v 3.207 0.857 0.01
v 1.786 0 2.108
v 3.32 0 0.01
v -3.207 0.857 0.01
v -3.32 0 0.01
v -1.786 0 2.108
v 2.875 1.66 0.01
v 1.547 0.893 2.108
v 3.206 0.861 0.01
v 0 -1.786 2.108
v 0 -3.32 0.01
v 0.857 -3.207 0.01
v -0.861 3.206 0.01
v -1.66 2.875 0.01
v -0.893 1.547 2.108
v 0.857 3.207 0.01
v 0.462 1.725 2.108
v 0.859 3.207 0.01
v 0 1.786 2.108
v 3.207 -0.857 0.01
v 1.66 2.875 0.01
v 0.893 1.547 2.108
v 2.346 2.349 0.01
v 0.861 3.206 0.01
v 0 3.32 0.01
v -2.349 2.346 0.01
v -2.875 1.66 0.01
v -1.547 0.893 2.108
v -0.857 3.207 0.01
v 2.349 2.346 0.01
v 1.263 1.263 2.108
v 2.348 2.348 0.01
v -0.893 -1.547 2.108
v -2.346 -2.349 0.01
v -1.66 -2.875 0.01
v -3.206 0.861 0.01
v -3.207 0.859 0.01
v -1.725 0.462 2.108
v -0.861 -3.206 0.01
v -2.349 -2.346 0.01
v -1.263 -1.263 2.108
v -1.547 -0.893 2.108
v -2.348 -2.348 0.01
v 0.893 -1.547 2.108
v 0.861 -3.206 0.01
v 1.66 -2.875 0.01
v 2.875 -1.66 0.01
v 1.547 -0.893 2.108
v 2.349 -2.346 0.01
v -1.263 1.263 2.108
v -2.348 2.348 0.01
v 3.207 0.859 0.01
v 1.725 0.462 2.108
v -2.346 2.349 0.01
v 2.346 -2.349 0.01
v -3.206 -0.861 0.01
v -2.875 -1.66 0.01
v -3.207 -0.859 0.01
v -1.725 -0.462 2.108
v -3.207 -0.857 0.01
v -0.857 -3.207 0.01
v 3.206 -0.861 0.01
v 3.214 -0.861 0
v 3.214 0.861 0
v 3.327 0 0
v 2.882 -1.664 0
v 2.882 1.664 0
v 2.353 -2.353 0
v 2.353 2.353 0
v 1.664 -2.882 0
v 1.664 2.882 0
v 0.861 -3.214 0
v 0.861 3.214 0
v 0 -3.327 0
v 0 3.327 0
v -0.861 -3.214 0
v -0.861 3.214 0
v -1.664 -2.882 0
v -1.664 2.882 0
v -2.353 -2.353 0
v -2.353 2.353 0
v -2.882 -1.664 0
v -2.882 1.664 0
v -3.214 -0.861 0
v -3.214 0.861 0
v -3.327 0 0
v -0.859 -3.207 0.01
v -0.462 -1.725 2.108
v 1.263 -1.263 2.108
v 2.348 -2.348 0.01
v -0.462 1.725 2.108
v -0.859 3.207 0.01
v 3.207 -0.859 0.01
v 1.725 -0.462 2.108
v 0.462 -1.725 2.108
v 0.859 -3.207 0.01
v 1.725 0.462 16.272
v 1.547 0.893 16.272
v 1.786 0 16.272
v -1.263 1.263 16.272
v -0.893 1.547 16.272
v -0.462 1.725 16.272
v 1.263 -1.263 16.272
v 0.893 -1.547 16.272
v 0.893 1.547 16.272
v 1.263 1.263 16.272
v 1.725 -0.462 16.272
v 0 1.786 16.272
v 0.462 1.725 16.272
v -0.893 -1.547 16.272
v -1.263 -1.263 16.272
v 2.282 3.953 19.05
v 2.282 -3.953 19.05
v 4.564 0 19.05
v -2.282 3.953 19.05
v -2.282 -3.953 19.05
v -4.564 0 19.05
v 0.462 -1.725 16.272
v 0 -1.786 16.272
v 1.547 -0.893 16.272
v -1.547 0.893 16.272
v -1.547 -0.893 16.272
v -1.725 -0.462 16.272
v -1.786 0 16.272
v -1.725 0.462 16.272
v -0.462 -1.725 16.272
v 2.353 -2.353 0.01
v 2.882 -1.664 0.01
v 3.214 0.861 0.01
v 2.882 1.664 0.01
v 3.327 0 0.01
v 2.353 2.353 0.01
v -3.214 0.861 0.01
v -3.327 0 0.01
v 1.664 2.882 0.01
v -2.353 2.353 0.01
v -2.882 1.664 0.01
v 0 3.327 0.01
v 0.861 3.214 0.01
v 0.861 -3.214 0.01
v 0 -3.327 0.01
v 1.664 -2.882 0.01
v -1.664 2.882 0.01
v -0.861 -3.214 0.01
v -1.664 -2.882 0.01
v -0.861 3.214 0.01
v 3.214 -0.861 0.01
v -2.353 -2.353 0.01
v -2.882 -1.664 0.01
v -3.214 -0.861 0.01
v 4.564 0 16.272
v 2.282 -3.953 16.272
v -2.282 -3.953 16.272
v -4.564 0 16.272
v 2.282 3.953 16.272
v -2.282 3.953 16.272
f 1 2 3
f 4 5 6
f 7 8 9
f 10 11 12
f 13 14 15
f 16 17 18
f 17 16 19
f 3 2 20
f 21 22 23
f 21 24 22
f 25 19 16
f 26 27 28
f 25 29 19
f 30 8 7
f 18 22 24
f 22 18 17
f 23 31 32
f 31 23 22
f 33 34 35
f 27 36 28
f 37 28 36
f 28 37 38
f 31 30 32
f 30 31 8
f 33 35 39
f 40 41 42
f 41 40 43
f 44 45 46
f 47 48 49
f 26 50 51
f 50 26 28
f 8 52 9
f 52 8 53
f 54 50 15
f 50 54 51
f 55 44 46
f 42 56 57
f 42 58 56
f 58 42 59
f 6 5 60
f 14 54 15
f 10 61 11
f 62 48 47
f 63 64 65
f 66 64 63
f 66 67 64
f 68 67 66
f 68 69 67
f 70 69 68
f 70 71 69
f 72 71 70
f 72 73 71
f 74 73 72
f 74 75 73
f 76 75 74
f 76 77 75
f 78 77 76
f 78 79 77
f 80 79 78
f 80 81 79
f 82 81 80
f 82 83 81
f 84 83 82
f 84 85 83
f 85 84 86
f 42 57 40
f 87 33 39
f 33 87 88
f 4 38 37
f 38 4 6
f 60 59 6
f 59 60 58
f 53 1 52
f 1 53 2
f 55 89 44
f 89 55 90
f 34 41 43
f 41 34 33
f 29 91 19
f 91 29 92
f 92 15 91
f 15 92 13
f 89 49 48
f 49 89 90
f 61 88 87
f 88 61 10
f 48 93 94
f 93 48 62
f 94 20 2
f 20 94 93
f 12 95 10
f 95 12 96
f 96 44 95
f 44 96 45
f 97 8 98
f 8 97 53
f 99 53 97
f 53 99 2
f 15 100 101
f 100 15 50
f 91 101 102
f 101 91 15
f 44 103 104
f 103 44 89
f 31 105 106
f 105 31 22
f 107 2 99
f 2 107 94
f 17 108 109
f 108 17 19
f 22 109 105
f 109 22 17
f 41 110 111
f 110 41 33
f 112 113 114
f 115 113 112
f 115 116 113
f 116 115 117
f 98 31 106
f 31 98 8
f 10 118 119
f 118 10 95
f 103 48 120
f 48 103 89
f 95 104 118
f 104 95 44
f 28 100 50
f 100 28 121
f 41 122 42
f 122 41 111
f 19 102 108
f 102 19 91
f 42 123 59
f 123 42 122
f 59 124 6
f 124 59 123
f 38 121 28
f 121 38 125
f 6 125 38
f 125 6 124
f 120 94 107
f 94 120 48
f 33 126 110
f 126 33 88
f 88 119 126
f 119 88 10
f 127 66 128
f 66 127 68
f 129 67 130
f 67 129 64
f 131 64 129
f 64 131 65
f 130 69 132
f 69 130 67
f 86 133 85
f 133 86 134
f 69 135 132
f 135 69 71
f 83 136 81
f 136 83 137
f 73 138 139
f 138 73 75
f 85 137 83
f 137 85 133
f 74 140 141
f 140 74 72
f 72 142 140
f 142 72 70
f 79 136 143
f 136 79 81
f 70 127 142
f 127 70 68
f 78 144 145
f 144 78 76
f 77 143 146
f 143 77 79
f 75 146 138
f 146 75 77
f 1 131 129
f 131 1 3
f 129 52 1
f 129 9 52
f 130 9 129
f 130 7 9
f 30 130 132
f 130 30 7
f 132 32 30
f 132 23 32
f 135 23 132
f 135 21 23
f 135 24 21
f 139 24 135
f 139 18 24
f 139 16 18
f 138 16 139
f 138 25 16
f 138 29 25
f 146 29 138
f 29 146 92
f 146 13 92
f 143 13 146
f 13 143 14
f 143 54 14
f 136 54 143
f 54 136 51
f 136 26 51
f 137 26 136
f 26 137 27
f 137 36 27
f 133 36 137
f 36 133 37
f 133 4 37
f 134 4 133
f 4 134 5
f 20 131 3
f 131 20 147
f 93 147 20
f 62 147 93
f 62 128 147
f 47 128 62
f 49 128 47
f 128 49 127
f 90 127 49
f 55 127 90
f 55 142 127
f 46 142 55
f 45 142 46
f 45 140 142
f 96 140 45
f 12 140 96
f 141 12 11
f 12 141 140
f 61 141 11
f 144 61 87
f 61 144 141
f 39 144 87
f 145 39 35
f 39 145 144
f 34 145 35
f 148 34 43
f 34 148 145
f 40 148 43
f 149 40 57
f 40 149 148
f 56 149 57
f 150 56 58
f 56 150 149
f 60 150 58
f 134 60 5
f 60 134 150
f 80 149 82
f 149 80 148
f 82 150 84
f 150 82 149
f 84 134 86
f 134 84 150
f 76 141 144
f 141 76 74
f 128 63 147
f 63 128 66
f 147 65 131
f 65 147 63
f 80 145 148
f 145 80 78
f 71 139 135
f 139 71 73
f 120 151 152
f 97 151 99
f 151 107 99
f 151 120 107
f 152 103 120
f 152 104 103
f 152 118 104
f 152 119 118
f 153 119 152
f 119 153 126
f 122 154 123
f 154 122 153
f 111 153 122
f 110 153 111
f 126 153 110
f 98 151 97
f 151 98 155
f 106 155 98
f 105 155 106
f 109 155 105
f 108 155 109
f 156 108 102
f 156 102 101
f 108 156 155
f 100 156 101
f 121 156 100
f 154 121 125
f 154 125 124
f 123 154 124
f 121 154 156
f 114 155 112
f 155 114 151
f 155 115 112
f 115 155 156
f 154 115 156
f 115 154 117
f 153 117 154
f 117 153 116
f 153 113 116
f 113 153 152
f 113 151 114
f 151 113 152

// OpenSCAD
// A small module defining some #6 hardware shapes
// Use solid=true to get the ouerall size of a cutout
// Use tol = .1 (or similar) to allow for printer inaccuracy
// 
IN_TO_MM = 25.4;

screw_and_nut(3/4 * IN_TO_MM, tol=0.0);
//hex_nut6_slot(10);

diameter6      = IN_TO_MM * 9 / 64;
nut6_outer_dia = IN_TO_MM * 23 / 64;
nut6_thickness = IN_TO_MM * 7 / 64;
head_height6 = IN_TO_MM * 0.083;
head_dia6    = IN_TO_MM * 0.262;


module screw_and_nut(length, tol=0.0) {
    translate ([0, 0, length-(nut6_thickness+tol)]) 
        hex_nut6(tol=tol, solid=false);
    machine_screw6(length, tol=tol);
}

    
module hex_nut6(tol = 0, solid = false) {
    linear_extrude (nut6_thickness+tol) {
        difference () {
            circle(tol + nut6_outer_dia/2, $fn = 6);
            if (!solid)
                circle(diameter6/2, $fn = 24);
        }

    }
}


module machine_screw6(length, tol=0)
{
    union() {
        translate([0, 0, tol]) {
            cylinder(head_height6, tol+head_dia6/2, tol+diameter6/2, $fn=24);
            cylinder(length-tol, tol+diameter6/2, tol+diameter6/2, $fn=24);
        }
        cylinder(tol+.01, tol+head_dia6/2, tol+head_dia6/2, $fn=24);
    }
}


module hex_nut6_slot(length, tol = 0) {
    linear_extrude (nut6_thickness+tol) {
        circle(tol + nut6_outer_dia/2, $fn = 6);
        translate([-(tol + nut6_outer_dia/2), 0, 0])
            square([tol + nut6_outer_dia, length]);
    }
}
